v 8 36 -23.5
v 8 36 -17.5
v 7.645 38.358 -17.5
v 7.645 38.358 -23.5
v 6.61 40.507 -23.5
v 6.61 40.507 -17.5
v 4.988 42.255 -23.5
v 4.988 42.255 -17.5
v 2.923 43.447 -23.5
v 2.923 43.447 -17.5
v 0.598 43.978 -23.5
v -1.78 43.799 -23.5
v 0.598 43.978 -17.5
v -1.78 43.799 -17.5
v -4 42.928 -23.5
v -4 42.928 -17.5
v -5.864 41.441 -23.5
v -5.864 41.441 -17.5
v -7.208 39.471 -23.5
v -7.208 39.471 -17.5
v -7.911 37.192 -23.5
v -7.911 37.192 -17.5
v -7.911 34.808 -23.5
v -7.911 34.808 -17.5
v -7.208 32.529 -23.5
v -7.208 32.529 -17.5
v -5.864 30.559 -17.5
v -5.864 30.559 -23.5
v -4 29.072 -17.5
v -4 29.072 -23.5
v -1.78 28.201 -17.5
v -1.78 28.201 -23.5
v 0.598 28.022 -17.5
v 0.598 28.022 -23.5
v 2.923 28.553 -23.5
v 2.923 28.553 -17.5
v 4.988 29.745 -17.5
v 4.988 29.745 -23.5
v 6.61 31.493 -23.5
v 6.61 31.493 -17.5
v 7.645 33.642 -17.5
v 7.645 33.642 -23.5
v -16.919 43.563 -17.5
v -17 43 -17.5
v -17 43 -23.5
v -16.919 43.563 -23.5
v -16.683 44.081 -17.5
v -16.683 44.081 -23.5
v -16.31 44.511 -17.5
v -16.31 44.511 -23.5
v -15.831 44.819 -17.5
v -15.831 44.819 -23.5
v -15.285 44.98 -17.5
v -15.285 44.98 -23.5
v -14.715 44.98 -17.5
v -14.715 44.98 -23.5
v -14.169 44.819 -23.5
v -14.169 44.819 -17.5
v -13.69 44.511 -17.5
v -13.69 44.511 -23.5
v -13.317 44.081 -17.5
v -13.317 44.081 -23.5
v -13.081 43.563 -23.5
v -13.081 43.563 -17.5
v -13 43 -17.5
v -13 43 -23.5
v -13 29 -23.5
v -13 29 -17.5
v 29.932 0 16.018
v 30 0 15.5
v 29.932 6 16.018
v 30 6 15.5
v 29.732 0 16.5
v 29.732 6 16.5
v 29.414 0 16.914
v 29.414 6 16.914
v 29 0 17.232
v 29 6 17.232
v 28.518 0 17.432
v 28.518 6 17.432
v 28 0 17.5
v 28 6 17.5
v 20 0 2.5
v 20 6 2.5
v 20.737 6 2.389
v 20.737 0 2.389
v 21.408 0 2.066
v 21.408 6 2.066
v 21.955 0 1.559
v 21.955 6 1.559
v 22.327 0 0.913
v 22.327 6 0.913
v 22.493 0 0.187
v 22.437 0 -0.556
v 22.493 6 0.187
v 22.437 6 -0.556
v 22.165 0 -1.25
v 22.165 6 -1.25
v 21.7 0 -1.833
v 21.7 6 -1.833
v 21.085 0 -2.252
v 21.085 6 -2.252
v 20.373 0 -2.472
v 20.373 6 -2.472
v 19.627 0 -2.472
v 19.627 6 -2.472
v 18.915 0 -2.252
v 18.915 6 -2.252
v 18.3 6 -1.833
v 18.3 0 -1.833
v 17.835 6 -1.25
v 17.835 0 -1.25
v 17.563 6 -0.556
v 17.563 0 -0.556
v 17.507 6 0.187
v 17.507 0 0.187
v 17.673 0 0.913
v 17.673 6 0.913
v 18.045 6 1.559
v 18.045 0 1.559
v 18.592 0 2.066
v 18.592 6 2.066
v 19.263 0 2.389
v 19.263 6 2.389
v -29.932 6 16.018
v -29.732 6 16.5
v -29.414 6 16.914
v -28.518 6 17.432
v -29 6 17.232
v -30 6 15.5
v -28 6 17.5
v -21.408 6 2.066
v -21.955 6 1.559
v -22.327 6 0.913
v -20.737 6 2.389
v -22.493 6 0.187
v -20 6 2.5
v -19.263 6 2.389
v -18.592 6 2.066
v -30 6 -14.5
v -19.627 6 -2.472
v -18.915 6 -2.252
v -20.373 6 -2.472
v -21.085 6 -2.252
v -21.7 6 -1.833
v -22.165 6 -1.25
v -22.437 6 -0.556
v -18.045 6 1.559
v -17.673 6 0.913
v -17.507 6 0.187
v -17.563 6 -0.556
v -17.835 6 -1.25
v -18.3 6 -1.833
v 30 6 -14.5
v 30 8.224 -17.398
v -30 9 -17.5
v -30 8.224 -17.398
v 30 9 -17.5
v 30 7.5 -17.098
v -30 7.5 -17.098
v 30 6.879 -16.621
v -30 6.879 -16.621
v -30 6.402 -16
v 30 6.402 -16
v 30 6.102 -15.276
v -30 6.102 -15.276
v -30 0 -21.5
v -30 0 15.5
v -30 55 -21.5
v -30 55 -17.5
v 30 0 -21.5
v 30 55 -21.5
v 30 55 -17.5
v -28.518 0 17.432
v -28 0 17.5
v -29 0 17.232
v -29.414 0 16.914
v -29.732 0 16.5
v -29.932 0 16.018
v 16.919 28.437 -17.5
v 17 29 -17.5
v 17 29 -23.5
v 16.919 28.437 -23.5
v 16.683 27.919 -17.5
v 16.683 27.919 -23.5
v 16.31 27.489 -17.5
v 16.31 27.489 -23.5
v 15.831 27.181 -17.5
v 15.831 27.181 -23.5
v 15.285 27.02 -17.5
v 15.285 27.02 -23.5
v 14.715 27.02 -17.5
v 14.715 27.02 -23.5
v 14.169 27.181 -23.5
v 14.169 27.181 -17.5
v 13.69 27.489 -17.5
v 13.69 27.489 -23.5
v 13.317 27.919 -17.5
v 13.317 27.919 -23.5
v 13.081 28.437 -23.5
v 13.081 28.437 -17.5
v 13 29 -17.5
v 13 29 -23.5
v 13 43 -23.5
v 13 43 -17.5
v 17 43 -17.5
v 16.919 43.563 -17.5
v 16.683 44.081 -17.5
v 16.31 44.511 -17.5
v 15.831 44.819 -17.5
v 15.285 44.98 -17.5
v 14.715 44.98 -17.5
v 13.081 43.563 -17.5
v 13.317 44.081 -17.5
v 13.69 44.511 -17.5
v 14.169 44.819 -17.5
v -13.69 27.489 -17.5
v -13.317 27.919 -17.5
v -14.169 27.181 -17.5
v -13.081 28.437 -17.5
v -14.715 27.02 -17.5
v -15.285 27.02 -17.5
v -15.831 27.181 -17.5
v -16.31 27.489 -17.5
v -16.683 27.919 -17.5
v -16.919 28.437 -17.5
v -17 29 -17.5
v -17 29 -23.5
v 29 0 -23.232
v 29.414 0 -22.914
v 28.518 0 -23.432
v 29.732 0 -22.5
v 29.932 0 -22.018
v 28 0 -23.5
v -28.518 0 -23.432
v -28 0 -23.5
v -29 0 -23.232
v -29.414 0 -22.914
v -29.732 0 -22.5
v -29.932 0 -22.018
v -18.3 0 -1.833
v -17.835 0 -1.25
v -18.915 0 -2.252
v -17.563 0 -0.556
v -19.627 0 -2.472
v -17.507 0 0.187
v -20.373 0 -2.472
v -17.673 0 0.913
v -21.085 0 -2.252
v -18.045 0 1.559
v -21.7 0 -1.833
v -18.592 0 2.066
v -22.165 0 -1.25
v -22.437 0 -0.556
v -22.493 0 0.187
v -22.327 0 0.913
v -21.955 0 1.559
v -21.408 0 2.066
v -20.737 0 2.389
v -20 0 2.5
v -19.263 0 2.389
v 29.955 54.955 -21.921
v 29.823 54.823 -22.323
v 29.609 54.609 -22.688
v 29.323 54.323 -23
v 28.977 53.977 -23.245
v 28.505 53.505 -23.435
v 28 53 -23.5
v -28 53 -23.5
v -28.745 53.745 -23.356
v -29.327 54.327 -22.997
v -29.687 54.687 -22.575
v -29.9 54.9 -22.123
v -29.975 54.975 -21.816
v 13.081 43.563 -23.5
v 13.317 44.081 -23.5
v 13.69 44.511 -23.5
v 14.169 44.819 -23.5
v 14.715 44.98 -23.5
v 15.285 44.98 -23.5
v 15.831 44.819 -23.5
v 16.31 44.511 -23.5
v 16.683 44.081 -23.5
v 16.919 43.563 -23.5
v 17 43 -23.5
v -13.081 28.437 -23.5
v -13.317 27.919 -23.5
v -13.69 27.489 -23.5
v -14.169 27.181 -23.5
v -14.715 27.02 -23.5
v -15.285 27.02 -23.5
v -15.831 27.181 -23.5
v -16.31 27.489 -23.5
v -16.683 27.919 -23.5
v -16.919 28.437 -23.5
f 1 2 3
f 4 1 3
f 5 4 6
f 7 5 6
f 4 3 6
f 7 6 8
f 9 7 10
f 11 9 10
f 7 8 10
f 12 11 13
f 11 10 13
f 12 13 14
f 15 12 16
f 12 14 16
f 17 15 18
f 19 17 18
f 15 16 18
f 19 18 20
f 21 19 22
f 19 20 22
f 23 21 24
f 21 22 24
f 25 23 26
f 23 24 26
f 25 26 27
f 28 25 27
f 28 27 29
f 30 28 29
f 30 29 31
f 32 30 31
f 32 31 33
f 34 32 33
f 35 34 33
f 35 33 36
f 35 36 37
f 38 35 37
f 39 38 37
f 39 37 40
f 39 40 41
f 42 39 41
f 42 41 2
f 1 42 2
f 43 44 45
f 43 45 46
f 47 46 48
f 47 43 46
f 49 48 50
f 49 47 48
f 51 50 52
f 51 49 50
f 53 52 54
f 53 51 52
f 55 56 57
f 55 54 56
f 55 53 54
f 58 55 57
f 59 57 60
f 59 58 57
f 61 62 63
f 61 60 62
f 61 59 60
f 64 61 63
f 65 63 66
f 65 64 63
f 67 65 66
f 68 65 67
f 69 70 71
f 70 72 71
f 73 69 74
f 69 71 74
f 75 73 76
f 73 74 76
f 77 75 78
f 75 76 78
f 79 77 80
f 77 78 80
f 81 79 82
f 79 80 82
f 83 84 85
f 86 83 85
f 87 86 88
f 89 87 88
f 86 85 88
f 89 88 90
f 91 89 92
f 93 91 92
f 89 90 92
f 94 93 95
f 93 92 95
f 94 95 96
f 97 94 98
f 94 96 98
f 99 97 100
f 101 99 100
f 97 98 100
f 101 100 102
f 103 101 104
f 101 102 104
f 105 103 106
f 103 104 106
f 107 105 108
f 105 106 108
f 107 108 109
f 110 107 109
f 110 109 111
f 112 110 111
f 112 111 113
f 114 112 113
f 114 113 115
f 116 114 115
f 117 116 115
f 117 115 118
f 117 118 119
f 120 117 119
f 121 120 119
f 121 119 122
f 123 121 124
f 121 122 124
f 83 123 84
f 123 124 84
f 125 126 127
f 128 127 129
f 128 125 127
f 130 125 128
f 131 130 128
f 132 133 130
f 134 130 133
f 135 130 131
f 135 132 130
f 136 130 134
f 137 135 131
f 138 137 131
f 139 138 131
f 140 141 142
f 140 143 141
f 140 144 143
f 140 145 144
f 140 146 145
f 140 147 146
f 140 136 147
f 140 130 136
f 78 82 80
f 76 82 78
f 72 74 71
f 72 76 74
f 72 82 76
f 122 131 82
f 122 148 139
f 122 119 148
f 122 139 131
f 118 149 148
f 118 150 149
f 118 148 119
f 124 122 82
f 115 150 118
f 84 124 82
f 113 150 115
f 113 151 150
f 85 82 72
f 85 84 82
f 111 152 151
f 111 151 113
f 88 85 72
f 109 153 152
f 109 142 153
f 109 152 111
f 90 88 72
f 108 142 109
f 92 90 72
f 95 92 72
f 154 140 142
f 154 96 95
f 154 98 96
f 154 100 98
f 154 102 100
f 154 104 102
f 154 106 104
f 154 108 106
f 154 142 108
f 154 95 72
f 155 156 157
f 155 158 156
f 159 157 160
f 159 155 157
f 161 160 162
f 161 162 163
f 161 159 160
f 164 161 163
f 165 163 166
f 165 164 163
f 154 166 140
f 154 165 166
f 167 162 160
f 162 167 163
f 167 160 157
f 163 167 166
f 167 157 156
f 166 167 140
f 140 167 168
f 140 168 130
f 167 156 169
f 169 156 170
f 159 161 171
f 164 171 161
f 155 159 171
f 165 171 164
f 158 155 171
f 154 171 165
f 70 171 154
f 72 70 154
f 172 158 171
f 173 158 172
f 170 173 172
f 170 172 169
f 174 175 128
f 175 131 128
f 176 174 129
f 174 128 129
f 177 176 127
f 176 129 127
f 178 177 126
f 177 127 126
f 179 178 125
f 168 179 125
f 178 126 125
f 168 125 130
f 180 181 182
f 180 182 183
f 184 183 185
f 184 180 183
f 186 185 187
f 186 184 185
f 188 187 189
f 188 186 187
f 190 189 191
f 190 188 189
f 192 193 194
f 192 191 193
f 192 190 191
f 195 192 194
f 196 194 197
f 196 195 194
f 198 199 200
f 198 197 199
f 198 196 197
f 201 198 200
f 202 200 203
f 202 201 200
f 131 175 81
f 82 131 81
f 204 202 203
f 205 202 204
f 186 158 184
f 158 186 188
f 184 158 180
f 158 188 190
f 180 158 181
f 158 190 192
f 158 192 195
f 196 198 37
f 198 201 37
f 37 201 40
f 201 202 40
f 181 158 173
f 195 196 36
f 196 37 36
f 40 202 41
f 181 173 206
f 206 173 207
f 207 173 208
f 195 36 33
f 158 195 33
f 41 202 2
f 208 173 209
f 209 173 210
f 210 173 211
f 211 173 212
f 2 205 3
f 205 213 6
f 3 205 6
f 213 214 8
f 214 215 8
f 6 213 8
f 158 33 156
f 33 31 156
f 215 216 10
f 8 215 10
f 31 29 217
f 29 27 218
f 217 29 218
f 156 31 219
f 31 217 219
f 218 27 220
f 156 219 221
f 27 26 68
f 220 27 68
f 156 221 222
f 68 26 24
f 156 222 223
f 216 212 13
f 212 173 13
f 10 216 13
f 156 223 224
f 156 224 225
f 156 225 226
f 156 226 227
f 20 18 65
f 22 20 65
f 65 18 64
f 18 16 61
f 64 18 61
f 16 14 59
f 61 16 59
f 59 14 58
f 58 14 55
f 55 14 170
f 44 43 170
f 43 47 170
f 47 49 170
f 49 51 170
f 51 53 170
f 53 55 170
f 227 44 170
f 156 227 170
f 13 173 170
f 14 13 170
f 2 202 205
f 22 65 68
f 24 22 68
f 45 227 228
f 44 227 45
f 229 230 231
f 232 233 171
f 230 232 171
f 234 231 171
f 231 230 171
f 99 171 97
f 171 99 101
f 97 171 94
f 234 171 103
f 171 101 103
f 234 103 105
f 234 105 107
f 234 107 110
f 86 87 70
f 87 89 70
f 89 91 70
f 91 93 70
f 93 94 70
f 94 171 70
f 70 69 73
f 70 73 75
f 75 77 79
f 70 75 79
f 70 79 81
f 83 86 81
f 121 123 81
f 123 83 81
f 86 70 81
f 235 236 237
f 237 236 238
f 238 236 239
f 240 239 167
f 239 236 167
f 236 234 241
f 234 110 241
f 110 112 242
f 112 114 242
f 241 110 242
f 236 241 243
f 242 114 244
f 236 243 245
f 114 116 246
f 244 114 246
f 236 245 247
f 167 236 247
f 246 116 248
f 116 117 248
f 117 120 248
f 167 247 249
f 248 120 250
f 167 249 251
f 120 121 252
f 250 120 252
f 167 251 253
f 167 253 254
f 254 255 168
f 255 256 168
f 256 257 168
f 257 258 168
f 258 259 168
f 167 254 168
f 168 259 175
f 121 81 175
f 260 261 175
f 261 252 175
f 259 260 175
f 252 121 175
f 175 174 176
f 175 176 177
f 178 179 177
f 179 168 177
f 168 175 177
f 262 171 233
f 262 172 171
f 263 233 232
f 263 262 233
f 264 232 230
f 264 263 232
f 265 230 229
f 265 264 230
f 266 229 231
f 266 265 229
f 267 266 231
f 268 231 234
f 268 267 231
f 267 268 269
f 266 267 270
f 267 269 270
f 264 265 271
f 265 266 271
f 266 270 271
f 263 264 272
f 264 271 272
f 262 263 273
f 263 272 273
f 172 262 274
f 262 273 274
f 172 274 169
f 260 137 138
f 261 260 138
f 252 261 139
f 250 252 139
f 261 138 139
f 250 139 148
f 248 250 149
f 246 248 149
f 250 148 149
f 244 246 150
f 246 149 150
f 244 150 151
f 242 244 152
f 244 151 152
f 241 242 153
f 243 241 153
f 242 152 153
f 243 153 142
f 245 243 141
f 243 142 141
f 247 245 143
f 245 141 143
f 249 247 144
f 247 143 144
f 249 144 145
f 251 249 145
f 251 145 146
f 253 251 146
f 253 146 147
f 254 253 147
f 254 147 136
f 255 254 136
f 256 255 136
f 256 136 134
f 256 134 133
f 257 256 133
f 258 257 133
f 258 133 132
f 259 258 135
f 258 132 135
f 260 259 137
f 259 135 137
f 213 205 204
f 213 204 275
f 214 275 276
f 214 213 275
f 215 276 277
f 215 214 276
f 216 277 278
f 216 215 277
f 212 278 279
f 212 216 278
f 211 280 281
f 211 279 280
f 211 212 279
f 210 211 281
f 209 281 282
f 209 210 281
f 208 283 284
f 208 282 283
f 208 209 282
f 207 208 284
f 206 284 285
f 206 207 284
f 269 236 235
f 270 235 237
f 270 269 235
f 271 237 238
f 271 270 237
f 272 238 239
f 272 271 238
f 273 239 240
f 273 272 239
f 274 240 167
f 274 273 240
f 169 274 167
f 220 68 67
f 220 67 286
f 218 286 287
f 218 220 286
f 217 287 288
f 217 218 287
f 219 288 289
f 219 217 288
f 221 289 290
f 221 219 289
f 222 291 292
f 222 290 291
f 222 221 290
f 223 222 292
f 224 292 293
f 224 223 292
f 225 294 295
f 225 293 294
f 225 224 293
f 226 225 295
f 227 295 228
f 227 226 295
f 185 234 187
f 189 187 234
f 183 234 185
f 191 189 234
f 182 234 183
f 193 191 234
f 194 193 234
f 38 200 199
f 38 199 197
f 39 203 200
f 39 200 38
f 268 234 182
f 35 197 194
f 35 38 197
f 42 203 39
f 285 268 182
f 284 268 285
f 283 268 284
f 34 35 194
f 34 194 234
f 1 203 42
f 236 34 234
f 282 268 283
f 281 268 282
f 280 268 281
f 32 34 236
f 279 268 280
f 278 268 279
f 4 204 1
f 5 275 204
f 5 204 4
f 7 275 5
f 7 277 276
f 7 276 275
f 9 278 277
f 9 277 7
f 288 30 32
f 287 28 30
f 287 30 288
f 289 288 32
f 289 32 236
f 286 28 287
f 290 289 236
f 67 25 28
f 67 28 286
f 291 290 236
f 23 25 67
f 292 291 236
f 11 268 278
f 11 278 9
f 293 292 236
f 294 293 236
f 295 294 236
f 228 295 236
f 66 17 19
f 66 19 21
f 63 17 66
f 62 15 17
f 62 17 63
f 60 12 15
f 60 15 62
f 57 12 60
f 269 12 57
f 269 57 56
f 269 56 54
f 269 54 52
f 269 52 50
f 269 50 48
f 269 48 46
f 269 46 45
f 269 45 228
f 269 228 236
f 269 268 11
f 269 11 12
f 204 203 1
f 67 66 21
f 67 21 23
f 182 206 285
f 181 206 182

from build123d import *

# Parameters (mm, degrees)
SKETCH2_W           = 60
SKETCH2_H           = 35
BOSS_EXTRUDE1_DEPTH = 6
SKETCH3_W           = 60
SKETCH3_H           = 55
BOSS_EXTRUDE2_DEPTH = 6
SKETCH4_R           = 8
CUT_EXTRUDE1_DEPTH  = 72.763500472
CUT_EXTRUDE2_DEPTH  = 72.763500472
SKETCH6_R           = 2.5
CUT_EXTRUDE3_DEPTH  = 6
FILLET1_R           = 2
FILLET2_R           = 3


with BuildPart() as part:
    # Sketch2 → Boss-Extrude1 (new body)
    with BuildSketch(Plane(origin=(0, 0, 0), x_dir=(1, 0, 0), z_dir=(0, 1, 0))):
        Rectangle(SKETCH2_W, SKETCH2_H)
    extrude(amount=BOSS_EXTRUDE1_DEPTH)

    # Sketch3 → Boss-Extrude2 (add)
    with BuildSketch(Plane(origin=(0, 0, -17.5), x_dir=(-1, 0, 0), z_dir=(0, 0, -1))):
        with Locations((0, 27.5)):
            Rectangle(SKETCH3_W, SKETCH3_H)
    extrude(amount=BOSS_EXTRUDE2_DEPTH)

    # Sketch4 → Cut-Extrude1 (cut, through all)
    with BuildSketch(Plane.XY.offset(-17.5)):
        with Locations((0, 36)):
            Circle(SKETCH4_R)
    extrude(amount=-CUT_EXTRUDE1_DEPTH, mode=Mode.SUBTRACT)

    # Sketch5 → Cut-Extrude2 (cut, through all)
    with BuildSketch(Plane.XY.offset(-17.5)):
        with BuildLine():
            Line((-13, 43), (-13, 29))
            ThreePointArc((-13, 29), (-15, 27), (-17, 29))
            Line((-17, 29), (-17, 43))
            ThreePointArc((-17, 43), (-15, 45), (-13, 43))
        make_face()
        with BuildLine():
            Line((17, 43), (17, 29))
            ThreePointArc((17, 29), (15, 27), (13, 29))
            Line((13, 29), (13, 43))
            ThreePointArc((13, 43), (15, 45), (17, 43))
        make_face()
    extrude(amount=-CUT_EXTRUDE2_DEPTH, mode=Mode.SUBTRACT)

    # Sketch6 → Cut-Extrude3 (cut)
    with BuildSketch(Plane(origin=(0, 6, 0), x_dir=(1, 0, 0), z_dir=(0, 1, 0))):
        with Locations(Location((-20, 0, 0), (0, 0, 270))):
            Circle(SKETCH6_R)
        with Locations(Location((20, 0, 0), (0, 0, 270))):
            Circle(SKETCH6_R)
    extrude(amount=-CUT_EXTRUDE3_DEPTH, mode=Mode.SUBTRACT)

    # Fillet1
    fillet1_edges = [part.edges().sort_by_distance(p)[0] for p in [
        (30, 27.5, -23.5),
        (-30, 27.5, -23.5),
        (0, 55, -23.5),
        (30, 3, 17.5),
        (-30, 3, 17.5),
    ]]
    fillet(fillet1_edges, radius=FILLET1_R)

    # Fillet2
    fillet2_edges = [part.edges().sort_by_distance(p)[0] for p in [
        (0, 6, -17.5),
    ]]
    fillet(fillet2_edges, radius=FILLET2_R)


solid = part.part
